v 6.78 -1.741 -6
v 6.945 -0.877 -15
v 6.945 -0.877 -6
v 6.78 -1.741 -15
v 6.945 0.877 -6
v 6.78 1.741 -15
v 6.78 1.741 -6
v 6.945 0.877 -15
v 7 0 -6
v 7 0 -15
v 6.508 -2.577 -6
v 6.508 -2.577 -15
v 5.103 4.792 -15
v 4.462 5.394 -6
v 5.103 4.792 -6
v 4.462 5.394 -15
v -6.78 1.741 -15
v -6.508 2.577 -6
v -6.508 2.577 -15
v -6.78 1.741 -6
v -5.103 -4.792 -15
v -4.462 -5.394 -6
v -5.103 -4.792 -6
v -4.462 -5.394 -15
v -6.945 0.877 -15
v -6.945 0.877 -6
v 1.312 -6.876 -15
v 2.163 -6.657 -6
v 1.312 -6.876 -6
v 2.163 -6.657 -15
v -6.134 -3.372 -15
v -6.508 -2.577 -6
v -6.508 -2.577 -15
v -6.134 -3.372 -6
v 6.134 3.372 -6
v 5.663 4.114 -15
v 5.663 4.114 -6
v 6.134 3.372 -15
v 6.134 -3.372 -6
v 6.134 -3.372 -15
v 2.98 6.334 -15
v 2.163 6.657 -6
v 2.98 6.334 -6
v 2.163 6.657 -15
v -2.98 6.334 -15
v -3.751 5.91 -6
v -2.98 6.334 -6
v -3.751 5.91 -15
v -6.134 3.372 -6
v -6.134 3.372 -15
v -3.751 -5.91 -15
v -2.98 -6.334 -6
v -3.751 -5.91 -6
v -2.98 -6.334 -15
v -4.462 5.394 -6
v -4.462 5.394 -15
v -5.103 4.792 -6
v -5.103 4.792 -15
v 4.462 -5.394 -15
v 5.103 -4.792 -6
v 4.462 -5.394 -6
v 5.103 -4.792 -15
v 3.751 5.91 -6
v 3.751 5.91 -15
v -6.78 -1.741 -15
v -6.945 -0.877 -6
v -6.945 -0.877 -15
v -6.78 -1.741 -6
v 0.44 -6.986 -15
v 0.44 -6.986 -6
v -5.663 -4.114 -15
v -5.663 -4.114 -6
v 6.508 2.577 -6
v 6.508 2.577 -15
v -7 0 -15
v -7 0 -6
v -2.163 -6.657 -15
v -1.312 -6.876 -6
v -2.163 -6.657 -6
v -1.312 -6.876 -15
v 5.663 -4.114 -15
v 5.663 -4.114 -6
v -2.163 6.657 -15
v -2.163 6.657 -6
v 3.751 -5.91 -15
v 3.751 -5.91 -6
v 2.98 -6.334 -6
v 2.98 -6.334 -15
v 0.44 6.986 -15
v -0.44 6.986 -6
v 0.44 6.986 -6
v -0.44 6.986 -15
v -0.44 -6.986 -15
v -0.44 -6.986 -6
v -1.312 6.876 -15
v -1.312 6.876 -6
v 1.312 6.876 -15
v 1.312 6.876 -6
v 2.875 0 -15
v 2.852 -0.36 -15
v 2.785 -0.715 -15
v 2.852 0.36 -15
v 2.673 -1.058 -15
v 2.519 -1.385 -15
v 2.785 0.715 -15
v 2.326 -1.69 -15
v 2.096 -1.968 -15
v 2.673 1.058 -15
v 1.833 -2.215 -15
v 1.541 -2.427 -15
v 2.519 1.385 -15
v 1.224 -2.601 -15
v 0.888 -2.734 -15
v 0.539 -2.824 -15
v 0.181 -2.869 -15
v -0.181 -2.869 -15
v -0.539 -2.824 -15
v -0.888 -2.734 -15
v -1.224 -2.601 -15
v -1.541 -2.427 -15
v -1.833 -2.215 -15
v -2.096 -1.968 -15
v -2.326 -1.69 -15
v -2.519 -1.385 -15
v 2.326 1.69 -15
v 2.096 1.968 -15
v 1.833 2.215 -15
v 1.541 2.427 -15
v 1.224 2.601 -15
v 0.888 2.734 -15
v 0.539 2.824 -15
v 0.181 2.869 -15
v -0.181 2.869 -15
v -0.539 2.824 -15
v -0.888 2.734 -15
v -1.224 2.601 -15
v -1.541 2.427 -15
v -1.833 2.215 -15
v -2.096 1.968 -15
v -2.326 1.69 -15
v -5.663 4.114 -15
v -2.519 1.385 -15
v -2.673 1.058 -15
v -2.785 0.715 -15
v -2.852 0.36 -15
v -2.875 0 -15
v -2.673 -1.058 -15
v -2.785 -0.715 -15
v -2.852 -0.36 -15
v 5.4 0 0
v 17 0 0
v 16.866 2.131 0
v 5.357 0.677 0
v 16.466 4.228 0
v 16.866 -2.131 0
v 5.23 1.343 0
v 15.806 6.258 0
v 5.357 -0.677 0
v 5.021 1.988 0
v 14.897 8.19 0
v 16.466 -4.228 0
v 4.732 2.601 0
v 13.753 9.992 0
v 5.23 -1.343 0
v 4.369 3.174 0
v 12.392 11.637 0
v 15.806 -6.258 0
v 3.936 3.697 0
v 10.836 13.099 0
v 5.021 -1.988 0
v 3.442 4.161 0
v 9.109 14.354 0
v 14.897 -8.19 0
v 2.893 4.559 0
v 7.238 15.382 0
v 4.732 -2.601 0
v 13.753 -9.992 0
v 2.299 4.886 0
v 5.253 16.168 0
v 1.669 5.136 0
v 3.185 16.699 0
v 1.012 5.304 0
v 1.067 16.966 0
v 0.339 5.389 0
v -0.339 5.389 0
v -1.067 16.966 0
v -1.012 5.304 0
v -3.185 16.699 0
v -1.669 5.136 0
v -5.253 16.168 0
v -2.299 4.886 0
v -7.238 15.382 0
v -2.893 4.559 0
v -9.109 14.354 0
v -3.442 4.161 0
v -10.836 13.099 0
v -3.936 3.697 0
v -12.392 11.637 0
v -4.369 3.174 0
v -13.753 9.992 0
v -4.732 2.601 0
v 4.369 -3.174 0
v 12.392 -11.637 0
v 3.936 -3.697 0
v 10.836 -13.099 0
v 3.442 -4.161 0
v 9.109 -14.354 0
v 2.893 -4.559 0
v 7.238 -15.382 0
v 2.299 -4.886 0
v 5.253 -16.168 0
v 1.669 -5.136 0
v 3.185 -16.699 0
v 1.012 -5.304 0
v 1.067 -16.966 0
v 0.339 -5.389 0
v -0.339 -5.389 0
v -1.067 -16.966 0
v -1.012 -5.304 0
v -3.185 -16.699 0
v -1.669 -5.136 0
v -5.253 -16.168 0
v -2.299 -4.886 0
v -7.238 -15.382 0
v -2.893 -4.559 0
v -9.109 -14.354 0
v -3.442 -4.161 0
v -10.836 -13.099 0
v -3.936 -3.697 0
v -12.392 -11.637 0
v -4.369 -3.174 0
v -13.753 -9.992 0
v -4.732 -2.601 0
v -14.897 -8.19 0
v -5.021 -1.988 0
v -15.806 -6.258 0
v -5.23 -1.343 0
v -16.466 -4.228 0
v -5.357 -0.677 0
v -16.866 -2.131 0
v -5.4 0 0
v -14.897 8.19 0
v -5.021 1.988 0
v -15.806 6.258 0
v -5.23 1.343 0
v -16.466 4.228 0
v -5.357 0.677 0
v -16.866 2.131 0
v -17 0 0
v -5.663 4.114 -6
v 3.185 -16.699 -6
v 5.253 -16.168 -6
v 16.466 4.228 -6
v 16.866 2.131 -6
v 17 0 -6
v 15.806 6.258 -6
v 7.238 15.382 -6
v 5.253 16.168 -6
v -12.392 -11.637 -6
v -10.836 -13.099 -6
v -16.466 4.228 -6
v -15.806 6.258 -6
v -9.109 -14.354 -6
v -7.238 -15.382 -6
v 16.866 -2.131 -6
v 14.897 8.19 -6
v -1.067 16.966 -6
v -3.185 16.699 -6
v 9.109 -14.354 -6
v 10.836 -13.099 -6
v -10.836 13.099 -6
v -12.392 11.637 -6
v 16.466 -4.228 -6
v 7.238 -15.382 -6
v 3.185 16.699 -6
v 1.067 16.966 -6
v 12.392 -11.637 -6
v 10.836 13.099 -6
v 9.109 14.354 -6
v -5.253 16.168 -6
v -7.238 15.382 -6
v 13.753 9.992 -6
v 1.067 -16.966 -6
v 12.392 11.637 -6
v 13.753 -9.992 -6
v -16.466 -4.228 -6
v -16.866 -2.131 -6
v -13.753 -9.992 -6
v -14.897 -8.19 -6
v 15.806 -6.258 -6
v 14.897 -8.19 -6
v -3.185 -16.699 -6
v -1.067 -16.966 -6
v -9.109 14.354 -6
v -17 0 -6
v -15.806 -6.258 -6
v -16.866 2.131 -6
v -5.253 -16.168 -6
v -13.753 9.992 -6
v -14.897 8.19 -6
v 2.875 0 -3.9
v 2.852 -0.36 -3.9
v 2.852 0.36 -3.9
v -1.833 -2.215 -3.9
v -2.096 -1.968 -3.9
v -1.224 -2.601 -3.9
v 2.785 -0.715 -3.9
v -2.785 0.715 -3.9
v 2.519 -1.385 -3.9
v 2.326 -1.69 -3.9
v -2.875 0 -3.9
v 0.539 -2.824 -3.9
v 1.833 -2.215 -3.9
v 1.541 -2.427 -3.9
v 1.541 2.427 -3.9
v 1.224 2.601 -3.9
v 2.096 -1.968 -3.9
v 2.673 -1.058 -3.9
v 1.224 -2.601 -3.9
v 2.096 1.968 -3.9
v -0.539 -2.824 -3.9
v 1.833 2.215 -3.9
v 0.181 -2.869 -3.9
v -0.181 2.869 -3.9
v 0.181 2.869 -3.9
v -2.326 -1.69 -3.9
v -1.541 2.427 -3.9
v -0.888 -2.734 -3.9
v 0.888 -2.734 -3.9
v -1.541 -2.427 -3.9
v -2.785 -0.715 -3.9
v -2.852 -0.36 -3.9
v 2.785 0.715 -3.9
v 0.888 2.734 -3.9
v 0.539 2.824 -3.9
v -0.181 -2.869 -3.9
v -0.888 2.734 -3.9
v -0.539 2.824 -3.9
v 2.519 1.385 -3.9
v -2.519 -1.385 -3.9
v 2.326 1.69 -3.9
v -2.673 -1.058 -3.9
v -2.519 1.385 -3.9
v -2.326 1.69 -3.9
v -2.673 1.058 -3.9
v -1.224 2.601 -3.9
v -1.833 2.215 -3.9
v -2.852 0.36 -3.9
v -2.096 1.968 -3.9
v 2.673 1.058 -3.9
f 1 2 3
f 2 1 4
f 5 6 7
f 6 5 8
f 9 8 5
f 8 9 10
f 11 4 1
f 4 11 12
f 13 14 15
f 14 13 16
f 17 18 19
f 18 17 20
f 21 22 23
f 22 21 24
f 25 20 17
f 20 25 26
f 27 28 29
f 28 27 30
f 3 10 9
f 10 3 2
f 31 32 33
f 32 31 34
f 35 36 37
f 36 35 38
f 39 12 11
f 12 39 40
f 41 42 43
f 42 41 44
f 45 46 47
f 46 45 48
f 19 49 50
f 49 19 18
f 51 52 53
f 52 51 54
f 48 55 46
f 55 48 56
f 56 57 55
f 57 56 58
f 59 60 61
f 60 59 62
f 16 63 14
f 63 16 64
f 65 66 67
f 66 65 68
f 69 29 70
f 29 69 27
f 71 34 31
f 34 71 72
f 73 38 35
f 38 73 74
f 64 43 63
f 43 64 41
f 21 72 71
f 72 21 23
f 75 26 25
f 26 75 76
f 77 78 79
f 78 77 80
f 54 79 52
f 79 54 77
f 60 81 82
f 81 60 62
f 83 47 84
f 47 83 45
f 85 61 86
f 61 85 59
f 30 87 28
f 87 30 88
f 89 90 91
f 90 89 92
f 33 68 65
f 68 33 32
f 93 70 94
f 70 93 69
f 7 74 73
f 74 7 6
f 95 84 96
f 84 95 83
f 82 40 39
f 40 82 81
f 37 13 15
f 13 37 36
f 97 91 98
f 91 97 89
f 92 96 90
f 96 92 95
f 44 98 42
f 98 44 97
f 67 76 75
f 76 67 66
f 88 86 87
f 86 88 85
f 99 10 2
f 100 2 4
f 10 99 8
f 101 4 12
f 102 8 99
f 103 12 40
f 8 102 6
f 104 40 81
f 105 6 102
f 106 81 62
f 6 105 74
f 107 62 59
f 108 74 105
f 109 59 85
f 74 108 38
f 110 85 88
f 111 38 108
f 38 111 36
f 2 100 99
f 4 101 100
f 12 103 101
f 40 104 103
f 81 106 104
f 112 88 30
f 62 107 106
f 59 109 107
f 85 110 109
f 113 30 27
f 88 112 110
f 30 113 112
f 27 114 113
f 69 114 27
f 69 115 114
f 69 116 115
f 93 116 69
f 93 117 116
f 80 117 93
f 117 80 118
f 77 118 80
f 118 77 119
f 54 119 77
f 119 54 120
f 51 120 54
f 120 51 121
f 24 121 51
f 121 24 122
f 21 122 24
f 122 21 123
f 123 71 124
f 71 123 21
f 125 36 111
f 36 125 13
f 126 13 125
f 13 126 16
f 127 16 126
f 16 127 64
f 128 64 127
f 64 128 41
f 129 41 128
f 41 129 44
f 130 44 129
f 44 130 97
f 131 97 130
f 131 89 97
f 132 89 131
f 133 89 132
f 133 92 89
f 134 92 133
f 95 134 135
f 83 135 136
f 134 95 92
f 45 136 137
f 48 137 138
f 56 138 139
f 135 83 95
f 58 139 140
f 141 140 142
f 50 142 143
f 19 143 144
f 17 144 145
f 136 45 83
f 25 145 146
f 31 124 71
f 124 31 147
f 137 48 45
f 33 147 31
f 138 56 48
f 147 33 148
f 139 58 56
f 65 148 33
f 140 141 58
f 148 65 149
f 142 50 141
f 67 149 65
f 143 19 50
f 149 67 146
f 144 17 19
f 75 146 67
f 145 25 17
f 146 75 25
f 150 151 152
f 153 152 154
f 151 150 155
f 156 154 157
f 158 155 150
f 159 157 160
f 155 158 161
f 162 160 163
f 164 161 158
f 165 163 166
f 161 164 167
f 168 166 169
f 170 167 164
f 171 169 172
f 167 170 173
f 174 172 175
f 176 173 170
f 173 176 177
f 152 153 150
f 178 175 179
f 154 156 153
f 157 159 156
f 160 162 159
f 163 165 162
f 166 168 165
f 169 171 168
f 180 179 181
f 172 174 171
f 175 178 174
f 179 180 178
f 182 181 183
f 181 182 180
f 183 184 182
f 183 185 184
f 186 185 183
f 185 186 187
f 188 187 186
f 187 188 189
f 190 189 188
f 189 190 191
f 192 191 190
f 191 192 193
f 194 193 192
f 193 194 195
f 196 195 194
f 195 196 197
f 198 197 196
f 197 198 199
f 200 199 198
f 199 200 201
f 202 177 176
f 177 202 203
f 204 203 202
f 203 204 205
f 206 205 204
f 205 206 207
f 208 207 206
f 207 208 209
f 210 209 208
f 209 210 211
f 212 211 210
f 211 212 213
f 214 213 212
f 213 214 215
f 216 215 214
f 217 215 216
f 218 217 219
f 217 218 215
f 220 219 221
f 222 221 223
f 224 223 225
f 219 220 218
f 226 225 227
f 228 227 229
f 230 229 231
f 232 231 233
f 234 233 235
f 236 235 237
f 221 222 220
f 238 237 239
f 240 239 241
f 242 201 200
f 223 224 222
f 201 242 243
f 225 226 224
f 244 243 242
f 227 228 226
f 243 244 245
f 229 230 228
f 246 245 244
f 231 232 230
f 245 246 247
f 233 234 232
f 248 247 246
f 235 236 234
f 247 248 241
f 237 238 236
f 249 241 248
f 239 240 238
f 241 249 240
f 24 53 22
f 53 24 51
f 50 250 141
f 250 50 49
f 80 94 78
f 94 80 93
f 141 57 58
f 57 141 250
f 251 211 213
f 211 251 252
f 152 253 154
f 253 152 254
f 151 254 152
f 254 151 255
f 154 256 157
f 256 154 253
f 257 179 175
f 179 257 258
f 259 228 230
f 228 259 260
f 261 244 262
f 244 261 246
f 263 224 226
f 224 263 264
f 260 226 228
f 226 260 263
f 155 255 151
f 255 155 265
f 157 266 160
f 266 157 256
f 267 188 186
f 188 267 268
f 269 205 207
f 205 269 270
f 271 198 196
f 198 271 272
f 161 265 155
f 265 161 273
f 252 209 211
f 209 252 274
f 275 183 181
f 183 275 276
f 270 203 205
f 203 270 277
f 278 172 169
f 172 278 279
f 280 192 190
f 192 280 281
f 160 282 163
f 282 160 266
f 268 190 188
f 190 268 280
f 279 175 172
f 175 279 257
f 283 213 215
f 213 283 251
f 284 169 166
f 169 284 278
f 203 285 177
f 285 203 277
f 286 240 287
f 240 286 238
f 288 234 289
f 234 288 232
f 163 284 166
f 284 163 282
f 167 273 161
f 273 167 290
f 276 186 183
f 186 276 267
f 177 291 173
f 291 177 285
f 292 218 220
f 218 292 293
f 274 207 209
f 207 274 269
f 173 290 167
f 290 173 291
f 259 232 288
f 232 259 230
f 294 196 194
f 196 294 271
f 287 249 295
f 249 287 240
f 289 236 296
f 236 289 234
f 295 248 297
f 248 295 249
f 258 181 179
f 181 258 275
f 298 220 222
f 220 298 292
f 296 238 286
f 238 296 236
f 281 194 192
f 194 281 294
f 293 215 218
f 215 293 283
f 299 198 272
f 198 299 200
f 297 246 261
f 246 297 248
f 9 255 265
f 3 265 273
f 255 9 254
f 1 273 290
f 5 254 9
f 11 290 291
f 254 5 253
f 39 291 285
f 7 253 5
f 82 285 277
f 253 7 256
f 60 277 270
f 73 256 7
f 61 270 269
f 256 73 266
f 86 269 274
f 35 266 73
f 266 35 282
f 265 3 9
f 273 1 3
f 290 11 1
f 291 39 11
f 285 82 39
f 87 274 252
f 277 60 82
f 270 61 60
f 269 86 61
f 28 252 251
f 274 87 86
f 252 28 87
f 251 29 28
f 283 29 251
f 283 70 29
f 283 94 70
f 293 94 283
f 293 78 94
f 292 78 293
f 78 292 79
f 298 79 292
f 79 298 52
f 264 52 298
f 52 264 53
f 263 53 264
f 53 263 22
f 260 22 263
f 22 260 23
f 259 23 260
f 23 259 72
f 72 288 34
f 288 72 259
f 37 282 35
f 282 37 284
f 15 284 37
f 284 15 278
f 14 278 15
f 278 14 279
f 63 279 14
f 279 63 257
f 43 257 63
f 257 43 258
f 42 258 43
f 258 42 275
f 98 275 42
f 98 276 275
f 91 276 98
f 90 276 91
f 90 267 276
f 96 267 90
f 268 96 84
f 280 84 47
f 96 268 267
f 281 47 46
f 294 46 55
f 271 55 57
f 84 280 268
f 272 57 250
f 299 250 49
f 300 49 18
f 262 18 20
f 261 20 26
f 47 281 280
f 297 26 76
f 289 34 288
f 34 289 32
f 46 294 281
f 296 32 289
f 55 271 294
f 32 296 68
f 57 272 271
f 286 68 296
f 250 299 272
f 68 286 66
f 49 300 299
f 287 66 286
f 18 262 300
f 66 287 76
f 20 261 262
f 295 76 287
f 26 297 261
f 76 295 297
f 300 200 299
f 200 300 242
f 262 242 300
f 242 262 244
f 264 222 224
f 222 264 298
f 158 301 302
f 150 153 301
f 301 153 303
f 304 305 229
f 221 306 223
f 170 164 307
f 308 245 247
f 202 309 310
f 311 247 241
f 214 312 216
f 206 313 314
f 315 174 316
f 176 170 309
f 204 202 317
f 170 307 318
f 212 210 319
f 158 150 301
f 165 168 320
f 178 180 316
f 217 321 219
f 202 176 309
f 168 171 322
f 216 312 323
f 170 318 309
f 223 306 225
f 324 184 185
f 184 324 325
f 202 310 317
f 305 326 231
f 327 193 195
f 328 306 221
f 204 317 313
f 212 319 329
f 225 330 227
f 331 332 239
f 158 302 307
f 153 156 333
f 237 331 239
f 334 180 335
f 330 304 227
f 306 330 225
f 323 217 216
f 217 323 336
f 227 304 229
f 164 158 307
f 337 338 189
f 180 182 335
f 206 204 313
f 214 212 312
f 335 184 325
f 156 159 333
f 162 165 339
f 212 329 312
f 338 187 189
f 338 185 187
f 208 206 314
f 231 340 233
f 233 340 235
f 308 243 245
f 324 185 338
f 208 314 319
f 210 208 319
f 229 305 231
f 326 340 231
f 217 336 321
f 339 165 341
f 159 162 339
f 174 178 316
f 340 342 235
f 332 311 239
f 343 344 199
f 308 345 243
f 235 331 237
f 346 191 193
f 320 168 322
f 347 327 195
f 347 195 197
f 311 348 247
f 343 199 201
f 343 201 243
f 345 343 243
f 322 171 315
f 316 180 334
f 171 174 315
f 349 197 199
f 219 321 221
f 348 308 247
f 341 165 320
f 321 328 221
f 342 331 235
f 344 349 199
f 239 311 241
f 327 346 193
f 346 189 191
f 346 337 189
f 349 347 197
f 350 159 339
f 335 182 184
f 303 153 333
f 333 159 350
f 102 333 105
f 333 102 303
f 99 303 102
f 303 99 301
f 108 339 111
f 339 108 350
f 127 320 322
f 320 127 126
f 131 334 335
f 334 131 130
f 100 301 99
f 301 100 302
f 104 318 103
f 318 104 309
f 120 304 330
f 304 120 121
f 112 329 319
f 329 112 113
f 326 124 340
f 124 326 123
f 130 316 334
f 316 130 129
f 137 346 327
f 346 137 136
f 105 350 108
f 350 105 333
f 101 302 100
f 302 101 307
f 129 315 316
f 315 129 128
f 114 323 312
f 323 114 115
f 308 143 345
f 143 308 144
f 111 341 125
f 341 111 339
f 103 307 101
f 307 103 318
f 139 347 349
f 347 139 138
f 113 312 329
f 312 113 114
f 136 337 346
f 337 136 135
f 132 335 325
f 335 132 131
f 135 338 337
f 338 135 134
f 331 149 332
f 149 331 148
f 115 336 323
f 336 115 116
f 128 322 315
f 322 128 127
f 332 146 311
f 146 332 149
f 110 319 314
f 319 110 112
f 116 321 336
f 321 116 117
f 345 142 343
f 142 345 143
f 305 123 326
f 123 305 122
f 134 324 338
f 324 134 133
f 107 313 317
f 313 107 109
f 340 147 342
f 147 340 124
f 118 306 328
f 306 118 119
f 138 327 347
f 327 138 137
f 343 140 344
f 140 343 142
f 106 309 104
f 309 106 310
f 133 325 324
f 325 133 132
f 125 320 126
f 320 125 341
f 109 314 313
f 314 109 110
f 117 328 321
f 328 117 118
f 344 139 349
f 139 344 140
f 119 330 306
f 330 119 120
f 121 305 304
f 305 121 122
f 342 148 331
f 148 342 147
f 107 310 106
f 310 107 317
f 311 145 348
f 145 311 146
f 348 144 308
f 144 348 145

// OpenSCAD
$fn = 50;


difference() {
	union() {
		translate(v = [0, 0, -15.0000000000]) {
			cylinder(h = 15, r = 7.0000000000);
		}
		translate(v = [0, 0, -6.0000000000]) {
			cylinder(h = 6, r = 17.0000000000);
		}
	}
	union() {
		translate(v = [0, 0, 0]) {
			rotate(a = [0, 0, 0]) {
				difference() {
					union() {
						#translate(v = [0, 0, -15.0000000000]) {
							cylinder(h = 15, r = 2.6000000000);
						}
						#translate(v = [0, 0, -3.9000000000]) {
							cylinder(h = 3.9000000000, r = 7.0000000000, r1 = 2.8750000000, r2 = 5.4000000000);
						}
						#translate(v = [0, 0, -15.0000000000]) {
							cylinder(h = 15, r = 2.8750000000);
						}
						#translate(v = [0, 0, -15.0000000000]) {
							cylinder(h = 15, r = 2.6000000000);
						}
					}
					union();
				}
			}
		}
	}
}
